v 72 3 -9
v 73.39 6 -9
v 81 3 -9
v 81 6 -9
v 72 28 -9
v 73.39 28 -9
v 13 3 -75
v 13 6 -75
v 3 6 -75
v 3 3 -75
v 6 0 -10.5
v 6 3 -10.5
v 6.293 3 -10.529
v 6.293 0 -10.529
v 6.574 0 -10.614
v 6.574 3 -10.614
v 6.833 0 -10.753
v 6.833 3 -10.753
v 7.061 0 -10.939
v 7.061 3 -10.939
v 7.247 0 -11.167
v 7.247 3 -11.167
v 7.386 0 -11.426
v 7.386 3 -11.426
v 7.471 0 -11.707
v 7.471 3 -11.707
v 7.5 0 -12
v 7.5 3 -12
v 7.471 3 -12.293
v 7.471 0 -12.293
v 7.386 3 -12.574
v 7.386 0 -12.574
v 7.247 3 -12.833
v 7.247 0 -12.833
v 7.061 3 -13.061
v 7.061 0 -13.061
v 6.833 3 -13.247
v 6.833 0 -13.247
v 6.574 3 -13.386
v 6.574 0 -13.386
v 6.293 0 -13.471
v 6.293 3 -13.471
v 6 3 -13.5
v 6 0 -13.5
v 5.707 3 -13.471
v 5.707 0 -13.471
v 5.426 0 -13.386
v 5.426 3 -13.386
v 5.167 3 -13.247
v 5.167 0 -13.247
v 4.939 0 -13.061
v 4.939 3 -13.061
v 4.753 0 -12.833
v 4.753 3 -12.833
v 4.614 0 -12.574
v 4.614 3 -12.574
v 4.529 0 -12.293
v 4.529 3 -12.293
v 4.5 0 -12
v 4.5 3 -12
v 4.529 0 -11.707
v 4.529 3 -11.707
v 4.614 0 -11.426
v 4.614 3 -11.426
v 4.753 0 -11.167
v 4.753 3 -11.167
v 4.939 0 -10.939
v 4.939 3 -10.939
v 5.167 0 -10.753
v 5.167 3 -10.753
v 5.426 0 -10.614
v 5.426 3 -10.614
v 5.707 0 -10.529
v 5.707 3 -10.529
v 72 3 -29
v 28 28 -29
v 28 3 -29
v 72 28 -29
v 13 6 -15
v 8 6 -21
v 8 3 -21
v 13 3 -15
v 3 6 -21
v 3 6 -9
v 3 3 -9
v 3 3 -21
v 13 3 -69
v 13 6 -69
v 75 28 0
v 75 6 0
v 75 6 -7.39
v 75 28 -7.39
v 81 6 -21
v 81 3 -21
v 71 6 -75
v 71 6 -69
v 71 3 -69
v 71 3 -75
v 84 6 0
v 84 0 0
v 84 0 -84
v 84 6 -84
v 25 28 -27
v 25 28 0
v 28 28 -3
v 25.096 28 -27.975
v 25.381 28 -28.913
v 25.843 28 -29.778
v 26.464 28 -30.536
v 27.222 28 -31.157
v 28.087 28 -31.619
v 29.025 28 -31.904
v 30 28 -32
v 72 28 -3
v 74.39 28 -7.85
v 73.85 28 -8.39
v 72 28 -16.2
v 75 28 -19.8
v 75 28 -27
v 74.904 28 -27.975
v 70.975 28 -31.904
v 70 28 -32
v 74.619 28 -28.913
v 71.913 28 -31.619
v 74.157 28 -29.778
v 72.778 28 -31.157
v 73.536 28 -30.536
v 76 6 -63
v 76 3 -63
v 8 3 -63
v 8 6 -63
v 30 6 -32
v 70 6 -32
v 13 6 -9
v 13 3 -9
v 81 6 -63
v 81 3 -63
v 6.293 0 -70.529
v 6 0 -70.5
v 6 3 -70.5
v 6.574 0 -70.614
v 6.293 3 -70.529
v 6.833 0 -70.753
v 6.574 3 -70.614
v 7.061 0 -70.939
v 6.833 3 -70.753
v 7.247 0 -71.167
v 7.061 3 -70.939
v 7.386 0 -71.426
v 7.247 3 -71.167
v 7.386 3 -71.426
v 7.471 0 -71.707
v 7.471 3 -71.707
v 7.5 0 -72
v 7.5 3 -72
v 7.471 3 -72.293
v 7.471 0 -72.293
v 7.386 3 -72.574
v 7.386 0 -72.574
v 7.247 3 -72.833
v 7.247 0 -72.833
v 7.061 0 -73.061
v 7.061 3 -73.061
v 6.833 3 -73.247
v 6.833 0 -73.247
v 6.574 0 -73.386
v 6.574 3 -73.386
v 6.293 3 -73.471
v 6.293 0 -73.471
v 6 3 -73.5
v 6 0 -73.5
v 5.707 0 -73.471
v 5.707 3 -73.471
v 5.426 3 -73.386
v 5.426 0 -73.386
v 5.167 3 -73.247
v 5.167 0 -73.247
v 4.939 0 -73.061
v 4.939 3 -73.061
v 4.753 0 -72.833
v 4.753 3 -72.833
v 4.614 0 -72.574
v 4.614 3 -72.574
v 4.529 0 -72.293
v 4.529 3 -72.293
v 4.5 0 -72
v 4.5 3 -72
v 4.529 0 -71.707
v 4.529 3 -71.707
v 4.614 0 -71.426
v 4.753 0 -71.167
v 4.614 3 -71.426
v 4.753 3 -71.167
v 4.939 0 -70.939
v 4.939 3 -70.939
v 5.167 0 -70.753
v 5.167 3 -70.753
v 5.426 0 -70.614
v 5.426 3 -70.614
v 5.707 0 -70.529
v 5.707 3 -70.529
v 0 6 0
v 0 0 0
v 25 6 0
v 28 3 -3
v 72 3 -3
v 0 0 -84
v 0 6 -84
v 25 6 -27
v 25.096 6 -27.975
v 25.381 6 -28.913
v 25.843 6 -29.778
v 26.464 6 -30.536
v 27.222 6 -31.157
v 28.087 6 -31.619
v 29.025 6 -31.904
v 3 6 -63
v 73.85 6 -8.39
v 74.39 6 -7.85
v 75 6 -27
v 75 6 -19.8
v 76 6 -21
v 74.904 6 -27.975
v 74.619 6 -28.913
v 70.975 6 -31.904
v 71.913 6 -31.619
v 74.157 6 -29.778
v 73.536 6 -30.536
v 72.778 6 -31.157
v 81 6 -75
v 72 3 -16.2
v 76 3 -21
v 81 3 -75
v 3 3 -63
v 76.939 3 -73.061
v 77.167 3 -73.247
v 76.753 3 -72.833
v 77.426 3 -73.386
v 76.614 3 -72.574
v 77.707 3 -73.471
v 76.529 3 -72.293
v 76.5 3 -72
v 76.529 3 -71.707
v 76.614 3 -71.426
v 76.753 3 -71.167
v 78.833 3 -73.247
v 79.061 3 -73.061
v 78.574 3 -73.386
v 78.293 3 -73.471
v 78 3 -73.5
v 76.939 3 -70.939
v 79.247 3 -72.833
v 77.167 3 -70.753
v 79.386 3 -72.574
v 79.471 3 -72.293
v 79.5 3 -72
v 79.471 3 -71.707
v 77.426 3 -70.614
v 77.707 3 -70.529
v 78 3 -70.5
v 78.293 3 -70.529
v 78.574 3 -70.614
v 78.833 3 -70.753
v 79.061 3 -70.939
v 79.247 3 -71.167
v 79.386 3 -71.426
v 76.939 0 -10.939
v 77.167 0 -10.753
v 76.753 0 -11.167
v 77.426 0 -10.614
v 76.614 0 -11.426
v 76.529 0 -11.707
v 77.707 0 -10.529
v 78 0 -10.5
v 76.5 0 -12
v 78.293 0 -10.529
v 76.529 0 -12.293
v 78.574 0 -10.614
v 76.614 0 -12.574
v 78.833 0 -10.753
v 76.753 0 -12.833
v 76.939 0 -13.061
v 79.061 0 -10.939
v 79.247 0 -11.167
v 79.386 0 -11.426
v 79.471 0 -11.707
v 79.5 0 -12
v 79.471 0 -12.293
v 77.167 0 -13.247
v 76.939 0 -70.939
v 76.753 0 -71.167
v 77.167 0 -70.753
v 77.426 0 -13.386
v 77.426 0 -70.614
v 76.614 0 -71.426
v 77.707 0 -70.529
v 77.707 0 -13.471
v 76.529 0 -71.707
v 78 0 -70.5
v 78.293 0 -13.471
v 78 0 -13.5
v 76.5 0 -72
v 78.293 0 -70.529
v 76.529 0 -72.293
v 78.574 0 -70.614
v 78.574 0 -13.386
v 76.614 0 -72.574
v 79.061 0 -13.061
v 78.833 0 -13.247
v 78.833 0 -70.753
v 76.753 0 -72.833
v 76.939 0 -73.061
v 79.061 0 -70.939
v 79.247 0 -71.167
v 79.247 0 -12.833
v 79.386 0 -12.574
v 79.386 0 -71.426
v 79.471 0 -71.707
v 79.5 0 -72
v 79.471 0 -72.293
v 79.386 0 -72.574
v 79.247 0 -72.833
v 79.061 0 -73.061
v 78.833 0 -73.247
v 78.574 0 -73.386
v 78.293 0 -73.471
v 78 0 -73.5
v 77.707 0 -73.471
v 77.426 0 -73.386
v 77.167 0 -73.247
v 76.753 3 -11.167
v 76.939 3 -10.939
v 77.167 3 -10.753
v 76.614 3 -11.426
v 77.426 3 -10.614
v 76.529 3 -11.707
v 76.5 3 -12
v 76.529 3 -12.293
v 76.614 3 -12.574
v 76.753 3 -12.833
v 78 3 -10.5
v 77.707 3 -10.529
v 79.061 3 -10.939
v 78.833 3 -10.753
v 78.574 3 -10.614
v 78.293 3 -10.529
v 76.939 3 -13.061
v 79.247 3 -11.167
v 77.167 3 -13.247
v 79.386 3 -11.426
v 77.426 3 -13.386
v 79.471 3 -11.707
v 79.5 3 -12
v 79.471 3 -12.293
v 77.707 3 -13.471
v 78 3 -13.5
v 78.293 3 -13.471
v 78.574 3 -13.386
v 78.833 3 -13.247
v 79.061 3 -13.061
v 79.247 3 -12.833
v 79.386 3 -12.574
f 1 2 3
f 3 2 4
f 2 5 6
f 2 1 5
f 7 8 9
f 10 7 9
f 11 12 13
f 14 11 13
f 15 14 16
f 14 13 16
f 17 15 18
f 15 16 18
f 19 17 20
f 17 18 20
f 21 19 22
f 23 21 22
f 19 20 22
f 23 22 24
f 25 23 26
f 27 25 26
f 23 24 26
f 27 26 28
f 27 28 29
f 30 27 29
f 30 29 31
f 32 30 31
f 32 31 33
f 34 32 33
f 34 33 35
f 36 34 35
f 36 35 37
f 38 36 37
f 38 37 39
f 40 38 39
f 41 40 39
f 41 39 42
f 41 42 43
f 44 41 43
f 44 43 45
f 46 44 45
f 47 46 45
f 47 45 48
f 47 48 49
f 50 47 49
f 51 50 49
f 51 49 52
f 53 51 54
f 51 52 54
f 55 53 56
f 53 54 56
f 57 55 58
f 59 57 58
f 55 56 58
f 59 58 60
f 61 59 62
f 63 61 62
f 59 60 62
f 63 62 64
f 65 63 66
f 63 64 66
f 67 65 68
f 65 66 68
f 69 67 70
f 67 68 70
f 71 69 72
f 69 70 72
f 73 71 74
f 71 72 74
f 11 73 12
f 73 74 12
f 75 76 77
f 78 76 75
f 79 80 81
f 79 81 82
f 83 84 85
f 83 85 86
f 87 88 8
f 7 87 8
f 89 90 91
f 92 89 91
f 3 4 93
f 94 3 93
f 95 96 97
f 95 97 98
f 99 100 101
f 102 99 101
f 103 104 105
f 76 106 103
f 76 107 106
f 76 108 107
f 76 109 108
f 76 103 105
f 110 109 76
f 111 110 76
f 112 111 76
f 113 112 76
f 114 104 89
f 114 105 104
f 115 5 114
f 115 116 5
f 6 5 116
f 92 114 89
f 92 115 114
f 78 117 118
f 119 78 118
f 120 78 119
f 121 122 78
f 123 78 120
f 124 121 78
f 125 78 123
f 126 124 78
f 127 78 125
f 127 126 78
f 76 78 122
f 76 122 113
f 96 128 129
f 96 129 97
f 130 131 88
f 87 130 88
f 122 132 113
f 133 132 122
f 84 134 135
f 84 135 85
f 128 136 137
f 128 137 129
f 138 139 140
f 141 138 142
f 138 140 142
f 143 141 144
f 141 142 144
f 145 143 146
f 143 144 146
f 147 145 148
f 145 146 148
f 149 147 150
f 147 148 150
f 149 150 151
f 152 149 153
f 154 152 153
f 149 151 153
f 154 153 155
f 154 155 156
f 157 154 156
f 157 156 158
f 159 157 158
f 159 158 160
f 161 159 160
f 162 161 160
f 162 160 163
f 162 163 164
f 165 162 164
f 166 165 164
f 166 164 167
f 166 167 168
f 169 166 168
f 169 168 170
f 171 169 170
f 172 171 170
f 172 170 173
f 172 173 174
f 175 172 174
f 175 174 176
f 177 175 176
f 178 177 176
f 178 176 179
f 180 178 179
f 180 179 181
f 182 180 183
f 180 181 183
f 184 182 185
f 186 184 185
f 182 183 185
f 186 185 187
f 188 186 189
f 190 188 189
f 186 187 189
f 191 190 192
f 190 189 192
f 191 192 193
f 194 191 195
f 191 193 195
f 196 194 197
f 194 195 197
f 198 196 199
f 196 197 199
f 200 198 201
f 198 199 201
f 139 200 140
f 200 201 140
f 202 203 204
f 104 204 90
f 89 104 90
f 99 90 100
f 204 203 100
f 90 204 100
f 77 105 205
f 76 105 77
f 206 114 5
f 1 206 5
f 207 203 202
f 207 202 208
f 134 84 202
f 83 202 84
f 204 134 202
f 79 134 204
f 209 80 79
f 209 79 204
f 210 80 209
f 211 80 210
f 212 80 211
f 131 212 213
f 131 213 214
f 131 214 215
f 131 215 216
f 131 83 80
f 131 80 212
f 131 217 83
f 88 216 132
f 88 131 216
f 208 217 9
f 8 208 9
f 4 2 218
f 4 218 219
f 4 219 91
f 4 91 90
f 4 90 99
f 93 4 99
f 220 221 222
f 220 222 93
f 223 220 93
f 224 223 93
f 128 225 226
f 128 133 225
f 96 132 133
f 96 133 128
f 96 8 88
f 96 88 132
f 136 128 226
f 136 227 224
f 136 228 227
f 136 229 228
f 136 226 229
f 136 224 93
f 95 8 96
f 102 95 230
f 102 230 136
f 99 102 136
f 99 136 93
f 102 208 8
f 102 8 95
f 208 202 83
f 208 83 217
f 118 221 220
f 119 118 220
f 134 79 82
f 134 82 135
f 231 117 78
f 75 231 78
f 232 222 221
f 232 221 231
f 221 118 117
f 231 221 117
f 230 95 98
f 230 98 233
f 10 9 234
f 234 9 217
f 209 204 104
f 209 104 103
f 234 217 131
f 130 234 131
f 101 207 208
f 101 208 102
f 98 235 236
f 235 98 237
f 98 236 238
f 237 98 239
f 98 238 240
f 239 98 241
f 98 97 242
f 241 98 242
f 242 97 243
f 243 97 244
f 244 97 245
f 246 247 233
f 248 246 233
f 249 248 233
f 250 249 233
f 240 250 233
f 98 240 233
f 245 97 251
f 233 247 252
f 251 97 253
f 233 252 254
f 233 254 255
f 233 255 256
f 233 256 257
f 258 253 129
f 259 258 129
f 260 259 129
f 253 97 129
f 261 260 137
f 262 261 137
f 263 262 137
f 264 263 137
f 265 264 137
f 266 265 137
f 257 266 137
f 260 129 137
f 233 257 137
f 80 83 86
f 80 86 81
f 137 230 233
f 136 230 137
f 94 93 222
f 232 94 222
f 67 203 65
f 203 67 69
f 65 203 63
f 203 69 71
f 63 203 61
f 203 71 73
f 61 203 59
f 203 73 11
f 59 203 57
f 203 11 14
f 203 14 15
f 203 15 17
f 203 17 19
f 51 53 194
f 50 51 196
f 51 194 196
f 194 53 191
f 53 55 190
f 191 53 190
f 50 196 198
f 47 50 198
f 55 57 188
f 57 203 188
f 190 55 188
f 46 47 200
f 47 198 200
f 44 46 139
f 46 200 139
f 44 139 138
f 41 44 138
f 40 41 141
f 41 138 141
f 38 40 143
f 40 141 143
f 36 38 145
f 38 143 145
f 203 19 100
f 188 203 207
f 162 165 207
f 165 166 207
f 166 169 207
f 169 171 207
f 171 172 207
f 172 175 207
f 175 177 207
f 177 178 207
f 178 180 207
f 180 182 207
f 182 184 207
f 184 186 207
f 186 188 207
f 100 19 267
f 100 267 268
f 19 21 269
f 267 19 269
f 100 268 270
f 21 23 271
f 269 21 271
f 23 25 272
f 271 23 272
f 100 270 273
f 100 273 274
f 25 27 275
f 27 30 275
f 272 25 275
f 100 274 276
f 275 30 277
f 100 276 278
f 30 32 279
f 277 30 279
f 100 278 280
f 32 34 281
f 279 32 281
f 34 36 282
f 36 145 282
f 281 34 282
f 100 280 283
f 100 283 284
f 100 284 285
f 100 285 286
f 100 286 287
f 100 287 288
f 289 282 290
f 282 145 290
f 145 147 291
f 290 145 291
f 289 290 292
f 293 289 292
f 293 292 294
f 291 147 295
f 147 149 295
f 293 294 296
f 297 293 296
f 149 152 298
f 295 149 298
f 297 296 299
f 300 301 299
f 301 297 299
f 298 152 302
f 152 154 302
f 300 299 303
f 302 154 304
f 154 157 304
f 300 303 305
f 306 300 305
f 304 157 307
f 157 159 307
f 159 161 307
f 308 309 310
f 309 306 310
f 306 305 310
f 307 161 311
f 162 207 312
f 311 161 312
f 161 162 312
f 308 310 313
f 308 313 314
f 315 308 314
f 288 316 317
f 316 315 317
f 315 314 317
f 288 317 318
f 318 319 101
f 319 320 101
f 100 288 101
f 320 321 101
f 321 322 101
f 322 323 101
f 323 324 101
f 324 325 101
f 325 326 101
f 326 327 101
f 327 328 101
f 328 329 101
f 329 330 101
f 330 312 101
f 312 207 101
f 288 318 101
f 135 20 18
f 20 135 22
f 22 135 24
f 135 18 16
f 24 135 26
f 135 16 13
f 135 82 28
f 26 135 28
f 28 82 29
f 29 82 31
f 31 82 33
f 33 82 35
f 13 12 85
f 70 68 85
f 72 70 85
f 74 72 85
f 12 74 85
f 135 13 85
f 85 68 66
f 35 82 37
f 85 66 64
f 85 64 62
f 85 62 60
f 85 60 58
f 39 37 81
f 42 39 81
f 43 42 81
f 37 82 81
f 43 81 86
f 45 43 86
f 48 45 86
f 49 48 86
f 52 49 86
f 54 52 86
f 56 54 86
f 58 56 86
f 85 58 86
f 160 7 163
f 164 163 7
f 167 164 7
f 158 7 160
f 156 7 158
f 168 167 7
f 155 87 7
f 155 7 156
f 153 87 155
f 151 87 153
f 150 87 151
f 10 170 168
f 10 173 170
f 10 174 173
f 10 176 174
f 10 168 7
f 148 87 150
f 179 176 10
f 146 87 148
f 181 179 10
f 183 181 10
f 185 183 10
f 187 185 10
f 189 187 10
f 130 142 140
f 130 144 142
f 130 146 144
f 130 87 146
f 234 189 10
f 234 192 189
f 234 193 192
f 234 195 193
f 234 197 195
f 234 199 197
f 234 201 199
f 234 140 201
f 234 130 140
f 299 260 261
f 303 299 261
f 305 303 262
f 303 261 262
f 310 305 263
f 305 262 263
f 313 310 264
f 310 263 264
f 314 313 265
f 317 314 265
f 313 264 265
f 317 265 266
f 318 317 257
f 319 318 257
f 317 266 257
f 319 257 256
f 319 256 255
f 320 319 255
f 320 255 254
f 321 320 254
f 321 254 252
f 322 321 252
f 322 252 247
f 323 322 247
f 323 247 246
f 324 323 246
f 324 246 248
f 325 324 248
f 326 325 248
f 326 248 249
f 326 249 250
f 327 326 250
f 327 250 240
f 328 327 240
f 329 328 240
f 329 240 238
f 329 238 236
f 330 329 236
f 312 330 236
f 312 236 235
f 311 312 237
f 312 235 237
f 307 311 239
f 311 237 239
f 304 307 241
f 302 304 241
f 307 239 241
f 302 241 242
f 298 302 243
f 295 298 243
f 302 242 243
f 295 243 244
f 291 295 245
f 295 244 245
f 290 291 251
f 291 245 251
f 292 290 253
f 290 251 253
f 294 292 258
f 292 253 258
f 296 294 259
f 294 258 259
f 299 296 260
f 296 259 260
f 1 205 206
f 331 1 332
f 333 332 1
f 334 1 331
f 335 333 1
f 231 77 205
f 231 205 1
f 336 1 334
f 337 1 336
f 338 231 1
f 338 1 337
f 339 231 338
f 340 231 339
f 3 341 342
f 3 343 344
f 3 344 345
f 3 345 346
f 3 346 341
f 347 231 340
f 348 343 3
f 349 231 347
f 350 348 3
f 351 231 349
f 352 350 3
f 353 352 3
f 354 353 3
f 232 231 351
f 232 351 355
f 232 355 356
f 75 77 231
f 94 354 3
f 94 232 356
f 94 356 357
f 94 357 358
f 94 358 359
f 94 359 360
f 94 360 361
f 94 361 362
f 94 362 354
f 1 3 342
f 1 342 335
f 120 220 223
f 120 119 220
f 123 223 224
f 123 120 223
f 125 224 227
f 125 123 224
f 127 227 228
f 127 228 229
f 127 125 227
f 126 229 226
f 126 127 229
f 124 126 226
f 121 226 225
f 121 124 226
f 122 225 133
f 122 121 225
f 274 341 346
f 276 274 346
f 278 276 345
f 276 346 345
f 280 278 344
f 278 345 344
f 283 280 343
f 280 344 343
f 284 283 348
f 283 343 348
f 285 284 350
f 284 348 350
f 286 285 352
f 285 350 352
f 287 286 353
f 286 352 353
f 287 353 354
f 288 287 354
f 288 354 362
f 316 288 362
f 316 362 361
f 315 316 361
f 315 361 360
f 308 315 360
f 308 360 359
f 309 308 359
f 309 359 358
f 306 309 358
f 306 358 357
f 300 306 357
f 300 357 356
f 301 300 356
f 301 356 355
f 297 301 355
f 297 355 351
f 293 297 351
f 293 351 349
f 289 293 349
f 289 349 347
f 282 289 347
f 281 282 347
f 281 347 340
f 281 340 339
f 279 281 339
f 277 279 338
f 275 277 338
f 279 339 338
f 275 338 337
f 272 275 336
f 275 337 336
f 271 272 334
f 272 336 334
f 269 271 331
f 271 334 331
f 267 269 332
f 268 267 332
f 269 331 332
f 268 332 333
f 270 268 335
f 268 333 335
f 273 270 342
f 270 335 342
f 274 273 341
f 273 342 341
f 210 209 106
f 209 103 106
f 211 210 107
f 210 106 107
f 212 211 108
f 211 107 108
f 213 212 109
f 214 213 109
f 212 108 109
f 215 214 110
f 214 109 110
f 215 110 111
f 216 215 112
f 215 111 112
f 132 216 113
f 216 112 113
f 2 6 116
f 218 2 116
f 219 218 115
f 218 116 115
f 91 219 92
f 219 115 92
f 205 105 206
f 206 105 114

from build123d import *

# Parameters (mm, degrees)
SKETCH1_W               = 84
SKETCH1_H               = 84
BOSS_EXTRUDE1_DEPTH     = 6
SKETCH2_R               = 1.5
CUT_EXTRUDE1_DEPTH      = 119.94536561
SKETCH4_R               = 1.5
CUT_EXTRUDE4_DEPTH      = 3
MIRROR3_COPY_1_SKETCH_R = 1.5
MIRROR3_COPY_1_DEPTH    = 3
SKETCH5_W               = 50
SKETCH5_H               = 32
BOSS_EXTRUDE2_DEPTH     = 22
SKETCH6_W               = 44
SKETCH6_H               = 26
CUT_EXTRUDE5_DEPTH      = 25
SKETCH8_R               = 5.5
CUT_EXTRUDE14_DEPTH     = 22
CUT_EXTRUDE15_DEPTH     = 122.396046064
FILLET2_R               = 5


with BuildPart() as part:
    # Sketch1 → Boss-Extrude1 (new body)
    with BuildSketch(Plane(origin=(0, 0, 0), x_dir=(1, 0, 0), z_dir=(0, 1, 0))):
        with Locations((42, 42)):
            Rectangle(SKETCH1_W, SKETCH1_H)
    extrude(amount=BOSS_EXTRUDE1_DEPTH)

    # Sketch2 → Cut-Extrude1 (cut, through all)
    with BuildSketch(Plane(origin=(0, 6, 0), x_dir=(1, 0, 0), z_dir=(0, 1, 0))):
        with Locations(Location((6, 72, 0), (0, 0, 270))):
            Circle(SKETCH2_R)
        with Locations(Location((6, 12, 0), (0, 0, 270))):
            Circle(SKETCH2_R)
        with Locations(Location((78, 12, 0), (0, 0, 270))):
            Circle(SKETCH2_R)
        with Locations(Location((78, 72, 0), (0, 0, 270))):
            Circle(SKETCH2_R)
    extrude(amount=-CUT_EXTRUDE1_DEPTH, mode=Mode.SUBTRACT)

    # Sketch4 → Cut-Extrude4 (cut)
    with BuildSketch(Plane(origin=(0, 6, 0), x_dir=(1, 0, 0), z_dir=(0, 1, 0))):
        Polygon((13, 15), (13, 9), (3, 9), (3, 21), (8, 21), align=None)
        with Locations(Location((6, 12, 0), (0, 0, 270))):
            Circle(SKETCH4_R, mode=Mode.SUBTRACT)
    cut_extrude4 = extrude(amount=-CUT_EXTRUDE4_DEPTH, mode=Mode.SUBTRACT)

    # Mirror2: Cut-Extrude4 across plane
    add(cut_extrude4.mirror(Plane.XY.offset(-42)), mode=Mode.SUBTRACT)

    # Mirror3: Cut-Extrude4 across plane
    add(cut_extrude4.mirror(Plane.ZY.offset(-42)), mode=Mode.SUBTRACT)

    # Mirror3 copy 1 sketch → Mirror3 copy 1 (cut)
    with BuildSketch(Plane(origin=(84, 6, -84), x_dir=(-1, 0, 0), z_dir=(0, 1, 0))):
        Polygon((13, 15), (13, 9), (3, 9), (3, 21), (8, 21), align=None)
        with Locations(Location((6, 12, 0), (0, 0, 270))):
            Circle(MIRROR3_COPY_1_SKETCH_R, mode=Mode.SUBTRACT)
    extrude(amount=-MIRROR3_COPY_1_DEPTH, mode=Mode.SUBTRACT)

    # Sketch5 → Boss-Extrude2 (add)
    with BuildSketch(Plane(origin=(0, 6, 0), x_dir=(1, 0, 0), z_dir=(0, 1, 0))):
        with Locations((50, 16)):
            Rectangle(SKETCH5_W, SKETCH5_H)
    extrude(amount=BOSS_EXTRUDE2_DEPTH)

    # Sketch6 → Cut-Extrude5 (cut)
    with BuildSketch(Plane(origin=(0, 28, 0), x_dir=(1, 0, 0), z_dir=(0, 1, 0))):
        with Locations((50, 16)):
            Rectangle(SKETCH6_W, SKETCH6_H)
    extrude(amount=-CUT_EXTRUDE5_DEPTH, mode=Mode.SUBTRACT)

    # Sketch8 → Cut-Extrude14 (cut)
    with BuildSketch(Plane(origin=(0, 28, 0), x_dir=(1, 0, 0), z_dir=(0, 1, 0))):
        with Locations((78, 12)):
            Circle(SKETCH8_R)
    extrude(amount=-CUT_EXTRUDE14_DEPTH, mode=Mode.SUBTRACT)

    # Sketch13 → Cut-Extrude15 (cut, through all)
    with BuildSketch(Plane(origin=(0, 3, 0), x_dir=(1, 0, 0), z_dir=(0, 1, 0))):
        Polygon((72, 9), (81, 9), (81, 21), (76, 21), (72, 16.2), (72, 29), (28, 29), (28, 3), (72, 3), align=None)
    extrude(amount=CUT_EXTRUDE15_DEPTH, mode=Mode.SUBTRACT)

    # Fillet2
    fillet2_edges = [part.edges().sort_by_distance(p)[0] for p in [
        (75, 17, -32),
        (25, 17, -32),
    ]]
    fillet(fillet2_edges, radius=FILLET2_R)


solid = part.part
